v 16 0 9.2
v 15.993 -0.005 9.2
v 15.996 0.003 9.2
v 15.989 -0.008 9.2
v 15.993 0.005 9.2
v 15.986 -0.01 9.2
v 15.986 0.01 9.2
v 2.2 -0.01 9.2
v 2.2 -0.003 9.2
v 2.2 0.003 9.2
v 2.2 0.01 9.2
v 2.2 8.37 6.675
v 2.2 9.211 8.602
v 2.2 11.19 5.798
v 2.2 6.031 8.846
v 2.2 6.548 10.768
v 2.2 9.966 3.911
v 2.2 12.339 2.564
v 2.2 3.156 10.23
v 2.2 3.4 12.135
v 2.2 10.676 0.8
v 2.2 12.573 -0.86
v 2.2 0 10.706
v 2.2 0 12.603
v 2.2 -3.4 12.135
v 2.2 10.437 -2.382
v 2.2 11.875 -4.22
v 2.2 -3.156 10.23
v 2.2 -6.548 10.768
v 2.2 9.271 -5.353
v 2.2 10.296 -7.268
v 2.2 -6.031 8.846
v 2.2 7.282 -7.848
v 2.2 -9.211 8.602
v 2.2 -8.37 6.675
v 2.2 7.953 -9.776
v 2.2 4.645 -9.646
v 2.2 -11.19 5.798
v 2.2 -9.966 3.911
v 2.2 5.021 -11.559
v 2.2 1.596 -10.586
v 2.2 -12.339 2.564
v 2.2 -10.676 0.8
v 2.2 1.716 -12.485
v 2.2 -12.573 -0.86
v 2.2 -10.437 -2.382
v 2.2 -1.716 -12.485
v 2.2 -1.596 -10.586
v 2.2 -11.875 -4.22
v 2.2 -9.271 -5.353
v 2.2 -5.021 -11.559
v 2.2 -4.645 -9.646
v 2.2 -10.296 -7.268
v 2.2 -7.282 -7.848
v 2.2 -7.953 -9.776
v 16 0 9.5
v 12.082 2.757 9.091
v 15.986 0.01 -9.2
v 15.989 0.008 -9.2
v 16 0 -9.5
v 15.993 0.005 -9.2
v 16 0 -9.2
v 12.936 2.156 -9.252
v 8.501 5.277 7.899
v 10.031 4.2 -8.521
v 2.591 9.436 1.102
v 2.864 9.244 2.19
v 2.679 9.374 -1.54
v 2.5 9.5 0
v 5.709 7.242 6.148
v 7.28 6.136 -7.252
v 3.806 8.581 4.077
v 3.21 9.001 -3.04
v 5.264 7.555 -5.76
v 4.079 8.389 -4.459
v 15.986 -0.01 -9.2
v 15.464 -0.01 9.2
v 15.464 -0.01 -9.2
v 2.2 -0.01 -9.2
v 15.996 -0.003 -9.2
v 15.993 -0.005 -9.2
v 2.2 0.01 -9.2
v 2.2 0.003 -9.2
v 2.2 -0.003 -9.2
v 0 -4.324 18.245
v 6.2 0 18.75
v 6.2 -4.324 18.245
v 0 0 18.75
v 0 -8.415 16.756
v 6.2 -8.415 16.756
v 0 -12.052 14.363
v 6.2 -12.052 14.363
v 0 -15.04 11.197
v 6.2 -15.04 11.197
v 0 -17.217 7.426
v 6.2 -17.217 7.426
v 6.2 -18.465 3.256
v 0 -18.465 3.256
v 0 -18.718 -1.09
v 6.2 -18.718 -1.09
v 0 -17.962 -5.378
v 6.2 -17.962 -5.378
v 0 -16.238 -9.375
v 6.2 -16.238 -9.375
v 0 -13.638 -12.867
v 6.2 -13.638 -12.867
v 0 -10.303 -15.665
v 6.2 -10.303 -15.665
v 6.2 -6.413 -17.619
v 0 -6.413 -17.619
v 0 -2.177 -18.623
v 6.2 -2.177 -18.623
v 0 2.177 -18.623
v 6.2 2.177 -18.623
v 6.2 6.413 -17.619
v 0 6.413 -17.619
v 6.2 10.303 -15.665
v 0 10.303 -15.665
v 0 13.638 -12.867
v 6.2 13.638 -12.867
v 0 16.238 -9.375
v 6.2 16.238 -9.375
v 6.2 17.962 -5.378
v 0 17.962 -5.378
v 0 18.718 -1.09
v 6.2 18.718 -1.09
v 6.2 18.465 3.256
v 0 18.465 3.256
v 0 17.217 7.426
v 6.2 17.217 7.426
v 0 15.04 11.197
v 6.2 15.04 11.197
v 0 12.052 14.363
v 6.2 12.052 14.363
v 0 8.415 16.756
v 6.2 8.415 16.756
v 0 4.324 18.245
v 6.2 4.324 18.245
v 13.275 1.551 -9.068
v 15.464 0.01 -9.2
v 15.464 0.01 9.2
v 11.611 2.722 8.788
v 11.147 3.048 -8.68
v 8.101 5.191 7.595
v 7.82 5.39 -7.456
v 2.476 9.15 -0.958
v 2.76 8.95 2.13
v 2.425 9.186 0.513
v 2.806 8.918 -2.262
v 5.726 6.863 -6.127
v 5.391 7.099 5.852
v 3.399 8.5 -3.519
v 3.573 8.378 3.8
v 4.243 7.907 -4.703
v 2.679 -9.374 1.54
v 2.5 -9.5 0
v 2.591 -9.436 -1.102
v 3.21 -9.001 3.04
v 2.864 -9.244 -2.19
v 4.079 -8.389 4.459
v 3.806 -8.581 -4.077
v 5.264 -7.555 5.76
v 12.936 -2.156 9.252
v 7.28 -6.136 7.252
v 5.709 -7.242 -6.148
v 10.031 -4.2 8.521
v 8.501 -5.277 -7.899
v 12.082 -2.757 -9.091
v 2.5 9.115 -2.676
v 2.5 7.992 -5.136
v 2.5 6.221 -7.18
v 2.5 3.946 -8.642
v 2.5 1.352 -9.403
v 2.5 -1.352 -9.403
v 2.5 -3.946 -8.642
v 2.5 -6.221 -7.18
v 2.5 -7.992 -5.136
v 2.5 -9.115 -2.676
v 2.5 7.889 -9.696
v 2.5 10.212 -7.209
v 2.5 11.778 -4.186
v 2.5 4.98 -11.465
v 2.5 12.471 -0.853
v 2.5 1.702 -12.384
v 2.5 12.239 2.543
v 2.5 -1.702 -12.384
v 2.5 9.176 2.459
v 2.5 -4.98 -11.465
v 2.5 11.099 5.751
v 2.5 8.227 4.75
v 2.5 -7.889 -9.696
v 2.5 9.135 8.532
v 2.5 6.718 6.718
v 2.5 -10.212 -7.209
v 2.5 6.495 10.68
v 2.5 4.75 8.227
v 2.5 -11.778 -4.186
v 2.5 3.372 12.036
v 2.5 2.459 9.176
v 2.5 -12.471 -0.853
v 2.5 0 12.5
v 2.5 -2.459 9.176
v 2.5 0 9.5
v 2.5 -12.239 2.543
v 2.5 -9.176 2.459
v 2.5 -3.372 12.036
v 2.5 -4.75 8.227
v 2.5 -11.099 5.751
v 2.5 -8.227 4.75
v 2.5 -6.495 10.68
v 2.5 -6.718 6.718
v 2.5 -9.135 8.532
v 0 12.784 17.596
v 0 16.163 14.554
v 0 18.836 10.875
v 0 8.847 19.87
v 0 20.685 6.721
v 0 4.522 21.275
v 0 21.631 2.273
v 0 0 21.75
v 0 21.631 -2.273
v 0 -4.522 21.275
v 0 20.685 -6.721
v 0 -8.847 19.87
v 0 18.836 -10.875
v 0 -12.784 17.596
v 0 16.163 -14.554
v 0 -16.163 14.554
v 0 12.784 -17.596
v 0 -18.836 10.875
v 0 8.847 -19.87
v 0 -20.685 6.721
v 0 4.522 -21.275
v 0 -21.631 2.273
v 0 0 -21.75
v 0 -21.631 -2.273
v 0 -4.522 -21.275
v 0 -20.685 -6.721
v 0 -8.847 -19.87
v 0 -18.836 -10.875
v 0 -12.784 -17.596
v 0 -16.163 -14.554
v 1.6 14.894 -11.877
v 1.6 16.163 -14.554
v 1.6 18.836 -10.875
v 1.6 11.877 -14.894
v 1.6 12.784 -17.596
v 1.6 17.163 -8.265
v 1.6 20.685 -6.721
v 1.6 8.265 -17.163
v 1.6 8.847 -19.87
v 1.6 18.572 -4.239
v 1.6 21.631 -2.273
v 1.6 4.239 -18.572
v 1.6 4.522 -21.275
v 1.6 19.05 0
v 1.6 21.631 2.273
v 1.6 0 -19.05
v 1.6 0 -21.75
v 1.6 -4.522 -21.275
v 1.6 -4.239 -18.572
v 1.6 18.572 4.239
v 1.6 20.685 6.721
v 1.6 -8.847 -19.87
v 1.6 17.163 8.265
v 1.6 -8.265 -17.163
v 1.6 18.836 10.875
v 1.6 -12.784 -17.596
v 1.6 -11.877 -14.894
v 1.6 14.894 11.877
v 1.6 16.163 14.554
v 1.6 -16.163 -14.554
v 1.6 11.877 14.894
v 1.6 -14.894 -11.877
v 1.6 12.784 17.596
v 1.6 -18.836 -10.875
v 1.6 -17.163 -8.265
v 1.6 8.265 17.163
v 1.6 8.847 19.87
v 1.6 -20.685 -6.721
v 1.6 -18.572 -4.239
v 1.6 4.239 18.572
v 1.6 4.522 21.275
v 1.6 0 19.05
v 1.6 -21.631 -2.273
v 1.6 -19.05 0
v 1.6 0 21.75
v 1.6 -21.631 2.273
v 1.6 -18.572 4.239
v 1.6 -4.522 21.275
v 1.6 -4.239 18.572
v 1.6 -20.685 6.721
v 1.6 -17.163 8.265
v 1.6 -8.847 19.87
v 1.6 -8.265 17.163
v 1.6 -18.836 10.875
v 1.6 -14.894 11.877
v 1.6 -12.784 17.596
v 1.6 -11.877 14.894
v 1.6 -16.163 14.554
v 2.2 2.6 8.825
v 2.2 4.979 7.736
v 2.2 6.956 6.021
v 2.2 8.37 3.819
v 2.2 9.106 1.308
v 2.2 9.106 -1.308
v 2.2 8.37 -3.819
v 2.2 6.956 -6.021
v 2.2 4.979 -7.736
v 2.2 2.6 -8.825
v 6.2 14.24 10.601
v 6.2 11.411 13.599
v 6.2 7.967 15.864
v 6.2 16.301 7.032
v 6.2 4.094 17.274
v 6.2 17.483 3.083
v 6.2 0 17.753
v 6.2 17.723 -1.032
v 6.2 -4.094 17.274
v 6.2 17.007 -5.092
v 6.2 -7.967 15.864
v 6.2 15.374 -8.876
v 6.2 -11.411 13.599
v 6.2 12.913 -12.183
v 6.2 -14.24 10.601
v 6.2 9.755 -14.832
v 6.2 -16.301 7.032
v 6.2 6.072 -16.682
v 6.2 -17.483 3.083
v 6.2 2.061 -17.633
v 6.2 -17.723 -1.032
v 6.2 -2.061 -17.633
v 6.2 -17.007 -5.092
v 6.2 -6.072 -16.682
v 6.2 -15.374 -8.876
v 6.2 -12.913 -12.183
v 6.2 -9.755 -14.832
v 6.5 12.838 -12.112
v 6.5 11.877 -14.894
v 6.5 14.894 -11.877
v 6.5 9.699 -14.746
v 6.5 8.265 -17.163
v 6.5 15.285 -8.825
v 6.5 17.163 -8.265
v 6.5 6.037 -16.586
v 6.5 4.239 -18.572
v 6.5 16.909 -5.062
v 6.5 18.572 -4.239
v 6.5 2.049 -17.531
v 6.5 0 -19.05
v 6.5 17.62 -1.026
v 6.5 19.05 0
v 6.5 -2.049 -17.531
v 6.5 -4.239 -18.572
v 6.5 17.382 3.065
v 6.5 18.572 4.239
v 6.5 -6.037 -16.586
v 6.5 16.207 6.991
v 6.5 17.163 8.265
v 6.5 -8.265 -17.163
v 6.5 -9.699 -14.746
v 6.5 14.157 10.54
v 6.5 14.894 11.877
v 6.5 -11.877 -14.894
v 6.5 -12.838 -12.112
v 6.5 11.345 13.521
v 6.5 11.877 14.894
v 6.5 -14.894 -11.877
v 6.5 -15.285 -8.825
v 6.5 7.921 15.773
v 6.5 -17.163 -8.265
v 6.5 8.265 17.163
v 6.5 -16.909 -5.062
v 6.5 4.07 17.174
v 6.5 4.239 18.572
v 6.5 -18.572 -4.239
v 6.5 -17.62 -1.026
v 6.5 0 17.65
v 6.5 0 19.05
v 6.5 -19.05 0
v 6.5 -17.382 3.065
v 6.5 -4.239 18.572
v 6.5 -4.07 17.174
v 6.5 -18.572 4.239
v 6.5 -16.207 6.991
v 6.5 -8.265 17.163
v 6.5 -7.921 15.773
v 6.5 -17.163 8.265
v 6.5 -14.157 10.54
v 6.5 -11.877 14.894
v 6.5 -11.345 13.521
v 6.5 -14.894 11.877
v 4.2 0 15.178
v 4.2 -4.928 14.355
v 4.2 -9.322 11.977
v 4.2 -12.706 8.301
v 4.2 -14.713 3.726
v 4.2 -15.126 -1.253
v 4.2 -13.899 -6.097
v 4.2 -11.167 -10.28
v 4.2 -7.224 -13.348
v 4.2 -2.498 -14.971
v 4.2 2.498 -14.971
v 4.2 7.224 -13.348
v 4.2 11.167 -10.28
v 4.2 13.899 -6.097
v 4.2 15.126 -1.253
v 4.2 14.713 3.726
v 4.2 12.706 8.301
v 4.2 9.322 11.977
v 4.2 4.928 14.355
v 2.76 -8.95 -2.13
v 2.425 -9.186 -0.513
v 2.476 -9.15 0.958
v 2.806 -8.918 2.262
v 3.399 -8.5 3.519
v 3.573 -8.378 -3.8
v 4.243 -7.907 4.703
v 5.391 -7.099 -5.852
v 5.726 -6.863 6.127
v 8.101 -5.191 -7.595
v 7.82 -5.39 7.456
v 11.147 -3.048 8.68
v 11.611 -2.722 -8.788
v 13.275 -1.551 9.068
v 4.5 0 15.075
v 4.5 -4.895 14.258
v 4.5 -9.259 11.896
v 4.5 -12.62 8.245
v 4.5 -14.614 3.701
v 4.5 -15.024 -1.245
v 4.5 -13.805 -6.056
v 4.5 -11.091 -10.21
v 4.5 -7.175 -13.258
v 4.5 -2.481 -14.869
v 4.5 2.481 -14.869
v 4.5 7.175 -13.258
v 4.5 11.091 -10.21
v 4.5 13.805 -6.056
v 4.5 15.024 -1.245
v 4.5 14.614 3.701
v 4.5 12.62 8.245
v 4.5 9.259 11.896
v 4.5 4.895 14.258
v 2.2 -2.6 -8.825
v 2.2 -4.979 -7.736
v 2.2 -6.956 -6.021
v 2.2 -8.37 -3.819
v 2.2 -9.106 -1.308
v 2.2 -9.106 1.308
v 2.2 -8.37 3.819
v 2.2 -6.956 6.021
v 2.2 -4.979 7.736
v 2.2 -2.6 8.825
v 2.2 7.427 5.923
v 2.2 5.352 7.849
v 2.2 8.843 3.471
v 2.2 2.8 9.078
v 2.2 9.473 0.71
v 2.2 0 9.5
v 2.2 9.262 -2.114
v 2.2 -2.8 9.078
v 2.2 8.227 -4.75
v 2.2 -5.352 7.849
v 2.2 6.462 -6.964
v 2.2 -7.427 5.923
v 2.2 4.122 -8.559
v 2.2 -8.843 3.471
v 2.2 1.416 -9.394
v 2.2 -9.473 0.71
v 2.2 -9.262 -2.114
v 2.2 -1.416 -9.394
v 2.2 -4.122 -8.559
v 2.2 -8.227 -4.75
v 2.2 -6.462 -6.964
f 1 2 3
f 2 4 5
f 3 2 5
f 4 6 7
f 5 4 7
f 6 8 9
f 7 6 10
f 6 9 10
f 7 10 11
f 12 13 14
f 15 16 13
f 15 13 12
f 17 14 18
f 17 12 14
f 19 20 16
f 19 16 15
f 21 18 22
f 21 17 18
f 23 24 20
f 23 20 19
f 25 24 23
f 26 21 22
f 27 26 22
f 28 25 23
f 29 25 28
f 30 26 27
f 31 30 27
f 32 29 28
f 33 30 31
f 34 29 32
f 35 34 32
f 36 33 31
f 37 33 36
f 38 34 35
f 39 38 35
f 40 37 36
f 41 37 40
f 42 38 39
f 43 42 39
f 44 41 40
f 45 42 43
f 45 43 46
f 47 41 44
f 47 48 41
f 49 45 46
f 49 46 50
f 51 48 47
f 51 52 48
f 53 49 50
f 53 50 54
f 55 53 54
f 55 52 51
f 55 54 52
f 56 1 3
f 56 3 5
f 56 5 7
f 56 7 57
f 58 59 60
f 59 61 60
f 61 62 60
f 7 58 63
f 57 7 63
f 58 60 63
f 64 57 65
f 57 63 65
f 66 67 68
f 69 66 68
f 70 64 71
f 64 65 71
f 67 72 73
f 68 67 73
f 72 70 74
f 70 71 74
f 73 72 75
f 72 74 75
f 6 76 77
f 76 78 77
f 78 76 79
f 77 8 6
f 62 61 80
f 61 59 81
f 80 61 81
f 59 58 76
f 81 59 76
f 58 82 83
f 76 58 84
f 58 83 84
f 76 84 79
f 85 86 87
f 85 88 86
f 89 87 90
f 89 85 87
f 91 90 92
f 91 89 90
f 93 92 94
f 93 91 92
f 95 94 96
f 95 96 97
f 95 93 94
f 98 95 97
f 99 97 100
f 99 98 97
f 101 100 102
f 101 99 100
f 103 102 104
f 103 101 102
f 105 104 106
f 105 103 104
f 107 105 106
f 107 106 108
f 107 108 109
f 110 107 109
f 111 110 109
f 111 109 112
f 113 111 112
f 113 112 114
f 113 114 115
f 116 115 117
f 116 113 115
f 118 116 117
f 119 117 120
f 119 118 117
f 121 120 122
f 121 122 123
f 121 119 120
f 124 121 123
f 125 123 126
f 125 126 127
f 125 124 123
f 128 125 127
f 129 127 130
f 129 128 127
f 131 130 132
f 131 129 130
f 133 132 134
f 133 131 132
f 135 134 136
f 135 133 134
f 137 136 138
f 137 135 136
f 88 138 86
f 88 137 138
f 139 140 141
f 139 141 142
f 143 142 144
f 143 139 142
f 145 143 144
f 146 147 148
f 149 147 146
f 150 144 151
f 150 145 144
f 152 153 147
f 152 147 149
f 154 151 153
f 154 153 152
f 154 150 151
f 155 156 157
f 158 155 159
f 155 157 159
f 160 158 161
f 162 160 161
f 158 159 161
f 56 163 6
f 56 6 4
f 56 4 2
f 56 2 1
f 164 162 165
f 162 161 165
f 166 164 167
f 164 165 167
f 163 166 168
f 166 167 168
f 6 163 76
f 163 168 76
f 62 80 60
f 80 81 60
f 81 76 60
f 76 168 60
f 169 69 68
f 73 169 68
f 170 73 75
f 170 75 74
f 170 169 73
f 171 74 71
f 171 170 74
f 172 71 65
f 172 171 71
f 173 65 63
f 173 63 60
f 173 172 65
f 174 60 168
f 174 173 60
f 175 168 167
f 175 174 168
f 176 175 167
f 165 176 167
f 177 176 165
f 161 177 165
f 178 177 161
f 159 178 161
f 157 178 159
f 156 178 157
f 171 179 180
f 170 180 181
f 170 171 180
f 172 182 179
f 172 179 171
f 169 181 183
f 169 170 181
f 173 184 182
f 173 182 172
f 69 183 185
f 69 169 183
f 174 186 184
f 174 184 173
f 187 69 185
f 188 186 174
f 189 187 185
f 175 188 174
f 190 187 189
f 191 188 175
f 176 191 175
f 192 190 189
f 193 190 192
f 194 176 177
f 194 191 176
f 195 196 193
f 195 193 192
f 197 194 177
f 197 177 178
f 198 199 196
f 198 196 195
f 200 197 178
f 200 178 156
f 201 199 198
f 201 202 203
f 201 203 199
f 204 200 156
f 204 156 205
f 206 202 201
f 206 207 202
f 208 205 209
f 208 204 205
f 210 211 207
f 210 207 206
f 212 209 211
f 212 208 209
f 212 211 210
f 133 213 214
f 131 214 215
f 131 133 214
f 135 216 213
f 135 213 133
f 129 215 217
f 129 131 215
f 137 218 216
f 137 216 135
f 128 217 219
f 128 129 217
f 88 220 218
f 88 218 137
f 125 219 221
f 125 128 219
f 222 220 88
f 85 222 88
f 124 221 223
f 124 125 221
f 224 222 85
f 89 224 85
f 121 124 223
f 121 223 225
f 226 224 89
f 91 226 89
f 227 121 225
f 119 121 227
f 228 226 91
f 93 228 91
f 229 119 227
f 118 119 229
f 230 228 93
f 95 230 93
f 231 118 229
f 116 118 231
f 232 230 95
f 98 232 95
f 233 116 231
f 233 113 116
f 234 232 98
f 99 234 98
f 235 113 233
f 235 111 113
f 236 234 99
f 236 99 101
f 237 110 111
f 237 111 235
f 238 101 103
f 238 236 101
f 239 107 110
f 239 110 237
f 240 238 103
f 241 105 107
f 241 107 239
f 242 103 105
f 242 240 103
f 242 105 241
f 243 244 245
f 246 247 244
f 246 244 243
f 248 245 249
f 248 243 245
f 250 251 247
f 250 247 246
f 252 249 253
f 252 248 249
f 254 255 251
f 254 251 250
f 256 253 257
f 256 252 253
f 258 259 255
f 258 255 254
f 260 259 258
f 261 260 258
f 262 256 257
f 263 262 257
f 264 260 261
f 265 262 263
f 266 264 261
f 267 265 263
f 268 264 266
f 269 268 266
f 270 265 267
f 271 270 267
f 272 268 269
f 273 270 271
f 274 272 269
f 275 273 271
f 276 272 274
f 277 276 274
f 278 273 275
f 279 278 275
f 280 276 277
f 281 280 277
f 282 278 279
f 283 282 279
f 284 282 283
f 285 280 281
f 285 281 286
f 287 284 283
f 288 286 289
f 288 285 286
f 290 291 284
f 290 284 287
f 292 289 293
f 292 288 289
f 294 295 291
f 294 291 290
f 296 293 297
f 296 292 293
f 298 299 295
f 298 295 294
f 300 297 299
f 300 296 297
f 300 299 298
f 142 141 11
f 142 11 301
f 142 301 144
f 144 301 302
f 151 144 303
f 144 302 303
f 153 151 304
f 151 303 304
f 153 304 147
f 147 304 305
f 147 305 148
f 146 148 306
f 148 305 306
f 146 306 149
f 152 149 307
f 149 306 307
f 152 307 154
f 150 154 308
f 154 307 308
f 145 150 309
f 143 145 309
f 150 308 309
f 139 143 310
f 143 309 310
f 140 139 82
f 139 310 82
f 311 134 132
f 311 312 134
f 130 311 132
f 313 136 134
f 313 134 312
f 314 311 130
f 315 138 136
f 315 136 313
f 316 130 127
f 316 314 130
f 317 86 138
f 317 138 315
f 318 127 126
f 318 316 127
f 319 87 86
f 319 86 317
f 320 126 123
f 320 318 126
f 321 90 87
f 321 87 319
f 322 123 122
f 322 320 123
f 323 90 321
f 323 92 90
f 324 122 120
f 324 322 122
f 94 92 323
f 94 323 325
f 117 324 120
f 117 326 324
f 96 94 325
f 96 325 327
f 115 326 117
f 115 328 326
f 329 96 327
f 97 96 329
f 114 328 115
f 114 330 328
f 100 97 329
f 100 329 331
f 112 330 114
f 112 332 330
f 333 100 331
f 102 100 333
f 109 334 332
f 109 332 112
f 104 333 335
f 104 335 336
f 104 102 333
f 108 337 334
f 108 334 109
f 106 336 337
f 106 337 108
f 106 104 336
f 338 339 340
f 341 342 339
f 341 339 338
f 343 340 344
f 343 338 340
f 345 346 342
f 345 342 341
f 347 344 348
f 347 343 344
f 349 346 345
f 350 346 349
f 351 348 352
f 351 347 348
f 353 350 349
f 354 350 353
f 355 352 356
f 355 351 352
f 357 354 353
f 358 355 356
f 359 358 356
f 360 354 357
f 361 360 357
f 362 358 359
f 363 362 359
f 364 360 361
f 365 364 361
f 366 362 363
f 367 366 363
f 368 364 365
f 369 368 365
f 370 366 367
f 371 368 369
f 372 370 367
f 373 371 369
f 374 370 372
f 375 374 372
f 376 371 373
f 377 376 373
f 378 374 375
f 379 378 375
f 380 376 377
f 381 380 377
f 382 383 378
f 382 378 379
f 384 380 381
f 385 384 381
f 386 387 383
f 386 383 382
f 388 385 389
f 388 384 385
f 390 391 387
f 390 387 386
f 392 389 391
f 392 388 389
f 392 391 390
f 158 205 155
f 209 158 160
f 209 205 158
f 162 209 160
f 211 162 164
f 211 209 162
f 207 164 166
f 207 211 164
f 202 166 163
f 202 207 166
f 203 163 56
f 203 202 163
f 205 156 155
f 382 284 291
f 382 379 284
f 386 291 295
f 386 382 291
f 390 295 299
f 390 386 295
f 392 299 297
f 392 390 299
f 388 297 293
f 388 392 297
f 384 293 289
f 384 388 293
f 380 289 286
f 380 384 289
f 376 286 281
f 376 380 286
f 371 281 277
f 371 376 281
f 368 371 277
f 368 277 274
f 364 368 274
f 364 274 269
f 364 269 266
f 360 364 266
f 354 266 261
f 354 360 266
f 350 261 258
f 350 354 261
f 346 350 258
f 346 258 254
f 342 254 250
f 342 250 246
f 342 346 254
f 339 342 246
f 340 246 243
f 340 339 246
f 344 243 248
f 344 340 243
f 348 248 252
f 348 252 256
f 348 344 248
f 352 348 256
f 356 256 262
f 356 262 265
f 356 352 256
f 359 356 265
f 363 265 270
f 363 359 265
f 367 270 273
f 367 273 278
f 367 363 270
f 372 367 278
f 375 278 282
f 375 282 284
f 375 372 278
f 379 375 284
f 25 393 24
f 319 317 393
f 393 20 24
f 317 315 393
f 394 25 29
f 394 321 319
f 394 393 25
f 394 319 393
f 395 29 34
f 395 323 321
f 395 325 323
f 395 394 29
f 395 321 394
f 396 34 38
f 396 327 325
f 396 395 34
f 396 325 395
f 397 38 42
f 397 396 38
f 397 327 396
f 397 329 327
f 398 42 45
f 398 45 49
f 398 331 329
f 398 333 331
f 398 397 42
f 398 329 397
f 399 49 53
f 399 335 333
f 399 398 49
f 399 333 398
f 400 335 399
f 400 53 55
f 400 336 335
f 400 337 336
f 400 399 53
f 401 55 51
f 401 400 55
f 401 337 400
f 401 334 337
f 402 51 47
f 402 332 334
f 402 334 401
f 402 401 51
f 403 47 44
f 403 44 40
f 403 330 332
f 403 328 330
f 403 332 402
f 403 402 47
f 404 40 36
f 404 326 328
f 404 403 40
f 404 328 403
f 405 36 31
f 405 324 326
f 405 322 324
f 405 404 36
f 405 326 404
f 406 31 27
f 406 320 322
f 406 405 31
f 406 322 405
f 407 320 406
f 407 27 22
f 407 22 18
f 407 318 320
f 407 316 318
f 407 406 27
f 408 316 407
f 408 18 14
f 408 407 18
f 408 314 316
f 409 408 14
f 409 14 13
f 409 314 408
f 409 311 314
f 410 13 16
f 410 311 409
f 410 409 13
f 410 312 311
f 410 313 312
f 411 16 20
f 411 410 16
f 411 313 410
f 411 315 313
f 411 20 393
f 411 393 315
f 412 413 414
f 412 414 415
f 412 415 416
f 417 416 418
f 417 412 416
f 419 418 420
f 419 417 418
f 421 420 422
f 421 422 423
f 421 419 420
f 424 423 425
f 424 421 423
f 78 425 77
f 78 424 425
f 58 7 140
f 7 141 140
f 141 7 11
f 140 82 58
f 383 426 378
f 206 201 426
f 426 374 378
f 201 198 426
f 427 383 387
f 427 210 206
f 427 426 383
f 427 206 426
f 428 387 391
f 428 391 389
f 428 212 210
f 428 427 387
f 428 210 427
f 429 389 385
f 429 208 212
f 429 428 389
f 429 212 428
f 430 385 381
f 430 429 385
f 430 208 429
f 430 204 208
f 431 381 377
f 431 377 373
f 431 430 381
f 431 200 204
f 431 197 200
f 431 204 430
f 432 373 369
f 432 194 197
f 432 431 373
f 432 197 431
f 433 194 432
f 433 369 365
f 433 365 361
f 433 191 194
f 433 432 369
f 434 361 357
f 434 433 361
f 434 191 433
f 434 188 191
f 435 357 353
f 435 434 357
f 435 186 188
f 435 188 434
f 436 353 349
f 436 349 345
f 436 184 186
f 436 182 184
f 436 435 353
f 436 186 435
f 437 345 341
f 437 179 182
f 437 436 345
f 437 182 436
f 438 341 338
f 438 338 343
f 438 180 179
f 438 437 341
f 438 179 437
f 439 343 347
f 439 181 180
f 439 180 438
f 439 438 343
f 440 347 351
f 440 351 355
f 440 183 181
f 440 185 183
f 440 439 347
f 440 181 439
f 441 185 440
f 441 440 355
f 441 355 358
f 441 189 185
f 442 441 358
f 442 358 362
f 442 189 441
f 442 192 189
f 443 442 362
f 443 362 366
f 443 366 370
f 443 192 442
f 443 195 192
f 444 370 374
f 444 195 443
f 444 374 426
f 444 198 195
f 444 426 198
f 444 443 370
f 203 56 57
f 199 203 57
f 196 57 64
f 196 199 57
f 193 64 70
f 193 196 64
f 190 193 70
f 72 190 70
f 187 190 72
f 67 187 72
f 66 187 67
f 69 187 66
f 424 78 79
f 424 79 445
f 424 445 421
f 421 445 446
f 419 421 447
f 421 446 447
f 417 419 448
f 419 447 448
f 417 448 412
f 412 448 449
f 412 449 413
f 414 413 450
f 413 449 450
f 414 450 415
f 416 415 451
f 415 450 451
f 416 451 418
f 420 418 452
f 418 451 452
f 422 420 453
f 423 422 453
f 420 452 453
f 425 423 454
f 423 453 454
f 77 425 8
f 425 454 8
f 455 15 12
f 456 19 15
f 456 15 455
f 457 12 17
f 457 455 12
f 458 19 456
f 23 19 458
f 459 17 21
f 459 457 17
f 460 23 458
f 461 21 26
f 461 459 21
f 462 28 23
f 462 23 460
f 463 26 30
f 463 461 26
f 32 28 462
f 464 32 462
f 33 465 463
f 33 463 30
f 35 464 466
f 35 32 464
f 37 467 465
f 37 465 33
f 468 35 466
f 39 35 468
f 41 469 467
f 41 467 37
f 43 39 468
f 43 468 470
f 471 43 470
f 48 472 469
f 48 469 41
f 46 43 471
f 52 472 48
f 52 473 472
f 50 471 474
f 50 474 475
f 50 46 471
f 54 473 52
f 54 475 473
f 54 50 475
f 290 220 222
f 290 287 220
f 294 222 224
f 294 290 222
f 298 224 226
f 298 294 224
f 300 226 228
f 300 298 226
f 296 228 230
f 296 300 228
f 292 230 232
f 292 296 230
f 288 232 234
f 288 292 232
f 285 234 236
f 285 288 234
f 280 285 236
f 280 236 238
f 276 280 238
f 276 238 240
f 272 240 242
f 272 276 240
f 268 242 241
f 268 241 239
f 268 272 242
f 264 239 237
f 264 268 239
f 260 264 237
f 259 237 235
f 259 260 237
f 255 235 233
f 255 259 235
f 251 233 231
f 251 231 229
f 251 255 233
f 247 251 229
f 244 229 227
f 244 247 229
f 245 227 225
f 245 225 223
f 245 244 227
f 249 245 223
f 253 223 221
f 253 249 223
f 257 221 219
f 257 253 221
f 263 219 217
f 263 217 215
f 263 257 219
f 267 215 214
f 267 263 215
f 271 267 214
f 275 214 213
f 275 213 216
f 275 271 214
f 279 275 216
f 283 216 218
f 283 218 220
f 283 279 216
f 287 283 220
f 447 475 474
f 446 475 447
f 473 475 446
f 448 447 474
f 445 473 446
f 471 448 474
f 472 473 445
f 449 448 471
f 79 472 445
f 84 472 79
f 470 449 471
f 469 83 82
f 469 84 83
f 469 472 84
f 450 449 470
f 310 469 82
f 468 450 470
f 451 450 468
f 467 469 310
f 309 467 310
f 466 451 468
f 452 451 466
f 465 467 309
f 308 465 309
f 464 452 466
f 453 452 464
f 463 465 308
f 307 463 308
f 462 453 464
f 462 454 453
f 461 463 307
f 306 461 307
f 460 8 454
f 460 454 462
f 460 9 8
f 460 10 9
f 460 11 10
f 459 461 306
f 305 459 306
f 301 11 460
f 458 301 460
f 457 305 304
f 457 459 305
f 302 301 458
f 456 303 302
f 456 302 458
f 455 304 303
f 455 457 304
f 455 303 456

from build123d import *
from build123d.topology import SkipClean

# Parameters (mm, degrees)
SKETCH3_R               = 9.5
BOSS_EXTRUDE1_DEPTH     = 16
CUT_EXTRUDE1_DEPTH      = 21.892582416
CUT_EXTRUDE1_DEPTH_BACK = 21.892582416
SHELL7_T                = -0.3
SKETCH8_R               = 10.705762979
CUT_EXTRUDE5_DEPTH      = 10
CUT_EXTRUDE6_DEPTH      = 30


with BuildPart() as part:
    # Sketch3 → Boss-Extrude1 (new body)
    with BuildSketch(Plane.ZY):
        Circle(SKETCH3_R)
    extrude(amount=-BOSS_EXTRUDE1_DEPTH)

    # Sketch4 → Cut-Extrude1 (cut, two sides: drawn at the far end of the back side and taken through both)
    with BuildSketch(Plane.XY.offset(-CUT_EXTRUDE1_DEPTH_BACK)):
        Polygon((2.5, 9.5), (18.05891099, 17.267926144), (18.05891099, -17.267926144), (2.5, -9.5), (16, 0), align=None)
    extrude(amount=CUT_EXTRUDE1_DEPTH + CUT_EXTRUDE1_DEPTH_BACK, mode=Mode.SUBTRACT)

    # Shell7
    shell7_openings = [part.faces().sort_by_distance(p)[0] for p in [
        (0, 0, 0),
    ]]
    offset(amount=SHELL7_T, openings=shell7_openings, kind=Kind.INTERSECTION)

    # Sketch1 → Revolve1 (revolve)
    with SkipClean():  # the faces are left unmerged after this step: merging them gives an invalid solid
        with BuildSketch(Plane.XY, mode=Mode.PRIVATE) as revolve1_sk:
            Polygon((0, 18.75), (0, 21.75), (1.6, 21.75), (1.6, 19.05), (6.5, 19.05), (6.5, 17.65), (2.5, 12.5), (2.5, 9.5), (2.2, 9.5), (2.2, 12.602819589), (6.2, 17.752819589), (6.2, 18.75), align=None)
        revolve(revolve1_sk.sketch.rotate(Axis((0, 0, 0), (1, 0, 0)), 90), axis=Axis((0, 0, 0), (1, 0, 0)))

    # Sketch8 → Cut-Extrude5 (cut)
    with SkipClean():  # the faces are left unmerged after this step: merging them gives an invalid solid
        with BuildSketch(Plane.ZY.offset(-2.2)):
            Circle(SKETCH8_R)
        extrude(amount=CUT_EXTRUDE5_DEPTH, mode=Mode.SUBTRACT)

    # Sketch9 → Cut-Extrude6 (cut)
    with SkipClean():  # the faces are left unmerged after this step: merging them gives an invalid solid
        with BuildSketch(Plane.ZY.offset(-2.2)):
            with BuildLine():
                Line((-9.2, -0.01), (9.2, -0.01))
                ThreePointArc((9.2, -0.01), (9.200005435, 0), (9.2, 0.01))
                Line((9.2, 0.01), (-9.2, 0.01))
                ThreePointArc((-9.2, 0.01), (-9.200005435, 0), (-9.2, -0.01))
            make_face()
        extrude(amount=-CUT_EXTRUDE6_DEPTH, mode=Mode.SUBTRACT)


solid = part.part
